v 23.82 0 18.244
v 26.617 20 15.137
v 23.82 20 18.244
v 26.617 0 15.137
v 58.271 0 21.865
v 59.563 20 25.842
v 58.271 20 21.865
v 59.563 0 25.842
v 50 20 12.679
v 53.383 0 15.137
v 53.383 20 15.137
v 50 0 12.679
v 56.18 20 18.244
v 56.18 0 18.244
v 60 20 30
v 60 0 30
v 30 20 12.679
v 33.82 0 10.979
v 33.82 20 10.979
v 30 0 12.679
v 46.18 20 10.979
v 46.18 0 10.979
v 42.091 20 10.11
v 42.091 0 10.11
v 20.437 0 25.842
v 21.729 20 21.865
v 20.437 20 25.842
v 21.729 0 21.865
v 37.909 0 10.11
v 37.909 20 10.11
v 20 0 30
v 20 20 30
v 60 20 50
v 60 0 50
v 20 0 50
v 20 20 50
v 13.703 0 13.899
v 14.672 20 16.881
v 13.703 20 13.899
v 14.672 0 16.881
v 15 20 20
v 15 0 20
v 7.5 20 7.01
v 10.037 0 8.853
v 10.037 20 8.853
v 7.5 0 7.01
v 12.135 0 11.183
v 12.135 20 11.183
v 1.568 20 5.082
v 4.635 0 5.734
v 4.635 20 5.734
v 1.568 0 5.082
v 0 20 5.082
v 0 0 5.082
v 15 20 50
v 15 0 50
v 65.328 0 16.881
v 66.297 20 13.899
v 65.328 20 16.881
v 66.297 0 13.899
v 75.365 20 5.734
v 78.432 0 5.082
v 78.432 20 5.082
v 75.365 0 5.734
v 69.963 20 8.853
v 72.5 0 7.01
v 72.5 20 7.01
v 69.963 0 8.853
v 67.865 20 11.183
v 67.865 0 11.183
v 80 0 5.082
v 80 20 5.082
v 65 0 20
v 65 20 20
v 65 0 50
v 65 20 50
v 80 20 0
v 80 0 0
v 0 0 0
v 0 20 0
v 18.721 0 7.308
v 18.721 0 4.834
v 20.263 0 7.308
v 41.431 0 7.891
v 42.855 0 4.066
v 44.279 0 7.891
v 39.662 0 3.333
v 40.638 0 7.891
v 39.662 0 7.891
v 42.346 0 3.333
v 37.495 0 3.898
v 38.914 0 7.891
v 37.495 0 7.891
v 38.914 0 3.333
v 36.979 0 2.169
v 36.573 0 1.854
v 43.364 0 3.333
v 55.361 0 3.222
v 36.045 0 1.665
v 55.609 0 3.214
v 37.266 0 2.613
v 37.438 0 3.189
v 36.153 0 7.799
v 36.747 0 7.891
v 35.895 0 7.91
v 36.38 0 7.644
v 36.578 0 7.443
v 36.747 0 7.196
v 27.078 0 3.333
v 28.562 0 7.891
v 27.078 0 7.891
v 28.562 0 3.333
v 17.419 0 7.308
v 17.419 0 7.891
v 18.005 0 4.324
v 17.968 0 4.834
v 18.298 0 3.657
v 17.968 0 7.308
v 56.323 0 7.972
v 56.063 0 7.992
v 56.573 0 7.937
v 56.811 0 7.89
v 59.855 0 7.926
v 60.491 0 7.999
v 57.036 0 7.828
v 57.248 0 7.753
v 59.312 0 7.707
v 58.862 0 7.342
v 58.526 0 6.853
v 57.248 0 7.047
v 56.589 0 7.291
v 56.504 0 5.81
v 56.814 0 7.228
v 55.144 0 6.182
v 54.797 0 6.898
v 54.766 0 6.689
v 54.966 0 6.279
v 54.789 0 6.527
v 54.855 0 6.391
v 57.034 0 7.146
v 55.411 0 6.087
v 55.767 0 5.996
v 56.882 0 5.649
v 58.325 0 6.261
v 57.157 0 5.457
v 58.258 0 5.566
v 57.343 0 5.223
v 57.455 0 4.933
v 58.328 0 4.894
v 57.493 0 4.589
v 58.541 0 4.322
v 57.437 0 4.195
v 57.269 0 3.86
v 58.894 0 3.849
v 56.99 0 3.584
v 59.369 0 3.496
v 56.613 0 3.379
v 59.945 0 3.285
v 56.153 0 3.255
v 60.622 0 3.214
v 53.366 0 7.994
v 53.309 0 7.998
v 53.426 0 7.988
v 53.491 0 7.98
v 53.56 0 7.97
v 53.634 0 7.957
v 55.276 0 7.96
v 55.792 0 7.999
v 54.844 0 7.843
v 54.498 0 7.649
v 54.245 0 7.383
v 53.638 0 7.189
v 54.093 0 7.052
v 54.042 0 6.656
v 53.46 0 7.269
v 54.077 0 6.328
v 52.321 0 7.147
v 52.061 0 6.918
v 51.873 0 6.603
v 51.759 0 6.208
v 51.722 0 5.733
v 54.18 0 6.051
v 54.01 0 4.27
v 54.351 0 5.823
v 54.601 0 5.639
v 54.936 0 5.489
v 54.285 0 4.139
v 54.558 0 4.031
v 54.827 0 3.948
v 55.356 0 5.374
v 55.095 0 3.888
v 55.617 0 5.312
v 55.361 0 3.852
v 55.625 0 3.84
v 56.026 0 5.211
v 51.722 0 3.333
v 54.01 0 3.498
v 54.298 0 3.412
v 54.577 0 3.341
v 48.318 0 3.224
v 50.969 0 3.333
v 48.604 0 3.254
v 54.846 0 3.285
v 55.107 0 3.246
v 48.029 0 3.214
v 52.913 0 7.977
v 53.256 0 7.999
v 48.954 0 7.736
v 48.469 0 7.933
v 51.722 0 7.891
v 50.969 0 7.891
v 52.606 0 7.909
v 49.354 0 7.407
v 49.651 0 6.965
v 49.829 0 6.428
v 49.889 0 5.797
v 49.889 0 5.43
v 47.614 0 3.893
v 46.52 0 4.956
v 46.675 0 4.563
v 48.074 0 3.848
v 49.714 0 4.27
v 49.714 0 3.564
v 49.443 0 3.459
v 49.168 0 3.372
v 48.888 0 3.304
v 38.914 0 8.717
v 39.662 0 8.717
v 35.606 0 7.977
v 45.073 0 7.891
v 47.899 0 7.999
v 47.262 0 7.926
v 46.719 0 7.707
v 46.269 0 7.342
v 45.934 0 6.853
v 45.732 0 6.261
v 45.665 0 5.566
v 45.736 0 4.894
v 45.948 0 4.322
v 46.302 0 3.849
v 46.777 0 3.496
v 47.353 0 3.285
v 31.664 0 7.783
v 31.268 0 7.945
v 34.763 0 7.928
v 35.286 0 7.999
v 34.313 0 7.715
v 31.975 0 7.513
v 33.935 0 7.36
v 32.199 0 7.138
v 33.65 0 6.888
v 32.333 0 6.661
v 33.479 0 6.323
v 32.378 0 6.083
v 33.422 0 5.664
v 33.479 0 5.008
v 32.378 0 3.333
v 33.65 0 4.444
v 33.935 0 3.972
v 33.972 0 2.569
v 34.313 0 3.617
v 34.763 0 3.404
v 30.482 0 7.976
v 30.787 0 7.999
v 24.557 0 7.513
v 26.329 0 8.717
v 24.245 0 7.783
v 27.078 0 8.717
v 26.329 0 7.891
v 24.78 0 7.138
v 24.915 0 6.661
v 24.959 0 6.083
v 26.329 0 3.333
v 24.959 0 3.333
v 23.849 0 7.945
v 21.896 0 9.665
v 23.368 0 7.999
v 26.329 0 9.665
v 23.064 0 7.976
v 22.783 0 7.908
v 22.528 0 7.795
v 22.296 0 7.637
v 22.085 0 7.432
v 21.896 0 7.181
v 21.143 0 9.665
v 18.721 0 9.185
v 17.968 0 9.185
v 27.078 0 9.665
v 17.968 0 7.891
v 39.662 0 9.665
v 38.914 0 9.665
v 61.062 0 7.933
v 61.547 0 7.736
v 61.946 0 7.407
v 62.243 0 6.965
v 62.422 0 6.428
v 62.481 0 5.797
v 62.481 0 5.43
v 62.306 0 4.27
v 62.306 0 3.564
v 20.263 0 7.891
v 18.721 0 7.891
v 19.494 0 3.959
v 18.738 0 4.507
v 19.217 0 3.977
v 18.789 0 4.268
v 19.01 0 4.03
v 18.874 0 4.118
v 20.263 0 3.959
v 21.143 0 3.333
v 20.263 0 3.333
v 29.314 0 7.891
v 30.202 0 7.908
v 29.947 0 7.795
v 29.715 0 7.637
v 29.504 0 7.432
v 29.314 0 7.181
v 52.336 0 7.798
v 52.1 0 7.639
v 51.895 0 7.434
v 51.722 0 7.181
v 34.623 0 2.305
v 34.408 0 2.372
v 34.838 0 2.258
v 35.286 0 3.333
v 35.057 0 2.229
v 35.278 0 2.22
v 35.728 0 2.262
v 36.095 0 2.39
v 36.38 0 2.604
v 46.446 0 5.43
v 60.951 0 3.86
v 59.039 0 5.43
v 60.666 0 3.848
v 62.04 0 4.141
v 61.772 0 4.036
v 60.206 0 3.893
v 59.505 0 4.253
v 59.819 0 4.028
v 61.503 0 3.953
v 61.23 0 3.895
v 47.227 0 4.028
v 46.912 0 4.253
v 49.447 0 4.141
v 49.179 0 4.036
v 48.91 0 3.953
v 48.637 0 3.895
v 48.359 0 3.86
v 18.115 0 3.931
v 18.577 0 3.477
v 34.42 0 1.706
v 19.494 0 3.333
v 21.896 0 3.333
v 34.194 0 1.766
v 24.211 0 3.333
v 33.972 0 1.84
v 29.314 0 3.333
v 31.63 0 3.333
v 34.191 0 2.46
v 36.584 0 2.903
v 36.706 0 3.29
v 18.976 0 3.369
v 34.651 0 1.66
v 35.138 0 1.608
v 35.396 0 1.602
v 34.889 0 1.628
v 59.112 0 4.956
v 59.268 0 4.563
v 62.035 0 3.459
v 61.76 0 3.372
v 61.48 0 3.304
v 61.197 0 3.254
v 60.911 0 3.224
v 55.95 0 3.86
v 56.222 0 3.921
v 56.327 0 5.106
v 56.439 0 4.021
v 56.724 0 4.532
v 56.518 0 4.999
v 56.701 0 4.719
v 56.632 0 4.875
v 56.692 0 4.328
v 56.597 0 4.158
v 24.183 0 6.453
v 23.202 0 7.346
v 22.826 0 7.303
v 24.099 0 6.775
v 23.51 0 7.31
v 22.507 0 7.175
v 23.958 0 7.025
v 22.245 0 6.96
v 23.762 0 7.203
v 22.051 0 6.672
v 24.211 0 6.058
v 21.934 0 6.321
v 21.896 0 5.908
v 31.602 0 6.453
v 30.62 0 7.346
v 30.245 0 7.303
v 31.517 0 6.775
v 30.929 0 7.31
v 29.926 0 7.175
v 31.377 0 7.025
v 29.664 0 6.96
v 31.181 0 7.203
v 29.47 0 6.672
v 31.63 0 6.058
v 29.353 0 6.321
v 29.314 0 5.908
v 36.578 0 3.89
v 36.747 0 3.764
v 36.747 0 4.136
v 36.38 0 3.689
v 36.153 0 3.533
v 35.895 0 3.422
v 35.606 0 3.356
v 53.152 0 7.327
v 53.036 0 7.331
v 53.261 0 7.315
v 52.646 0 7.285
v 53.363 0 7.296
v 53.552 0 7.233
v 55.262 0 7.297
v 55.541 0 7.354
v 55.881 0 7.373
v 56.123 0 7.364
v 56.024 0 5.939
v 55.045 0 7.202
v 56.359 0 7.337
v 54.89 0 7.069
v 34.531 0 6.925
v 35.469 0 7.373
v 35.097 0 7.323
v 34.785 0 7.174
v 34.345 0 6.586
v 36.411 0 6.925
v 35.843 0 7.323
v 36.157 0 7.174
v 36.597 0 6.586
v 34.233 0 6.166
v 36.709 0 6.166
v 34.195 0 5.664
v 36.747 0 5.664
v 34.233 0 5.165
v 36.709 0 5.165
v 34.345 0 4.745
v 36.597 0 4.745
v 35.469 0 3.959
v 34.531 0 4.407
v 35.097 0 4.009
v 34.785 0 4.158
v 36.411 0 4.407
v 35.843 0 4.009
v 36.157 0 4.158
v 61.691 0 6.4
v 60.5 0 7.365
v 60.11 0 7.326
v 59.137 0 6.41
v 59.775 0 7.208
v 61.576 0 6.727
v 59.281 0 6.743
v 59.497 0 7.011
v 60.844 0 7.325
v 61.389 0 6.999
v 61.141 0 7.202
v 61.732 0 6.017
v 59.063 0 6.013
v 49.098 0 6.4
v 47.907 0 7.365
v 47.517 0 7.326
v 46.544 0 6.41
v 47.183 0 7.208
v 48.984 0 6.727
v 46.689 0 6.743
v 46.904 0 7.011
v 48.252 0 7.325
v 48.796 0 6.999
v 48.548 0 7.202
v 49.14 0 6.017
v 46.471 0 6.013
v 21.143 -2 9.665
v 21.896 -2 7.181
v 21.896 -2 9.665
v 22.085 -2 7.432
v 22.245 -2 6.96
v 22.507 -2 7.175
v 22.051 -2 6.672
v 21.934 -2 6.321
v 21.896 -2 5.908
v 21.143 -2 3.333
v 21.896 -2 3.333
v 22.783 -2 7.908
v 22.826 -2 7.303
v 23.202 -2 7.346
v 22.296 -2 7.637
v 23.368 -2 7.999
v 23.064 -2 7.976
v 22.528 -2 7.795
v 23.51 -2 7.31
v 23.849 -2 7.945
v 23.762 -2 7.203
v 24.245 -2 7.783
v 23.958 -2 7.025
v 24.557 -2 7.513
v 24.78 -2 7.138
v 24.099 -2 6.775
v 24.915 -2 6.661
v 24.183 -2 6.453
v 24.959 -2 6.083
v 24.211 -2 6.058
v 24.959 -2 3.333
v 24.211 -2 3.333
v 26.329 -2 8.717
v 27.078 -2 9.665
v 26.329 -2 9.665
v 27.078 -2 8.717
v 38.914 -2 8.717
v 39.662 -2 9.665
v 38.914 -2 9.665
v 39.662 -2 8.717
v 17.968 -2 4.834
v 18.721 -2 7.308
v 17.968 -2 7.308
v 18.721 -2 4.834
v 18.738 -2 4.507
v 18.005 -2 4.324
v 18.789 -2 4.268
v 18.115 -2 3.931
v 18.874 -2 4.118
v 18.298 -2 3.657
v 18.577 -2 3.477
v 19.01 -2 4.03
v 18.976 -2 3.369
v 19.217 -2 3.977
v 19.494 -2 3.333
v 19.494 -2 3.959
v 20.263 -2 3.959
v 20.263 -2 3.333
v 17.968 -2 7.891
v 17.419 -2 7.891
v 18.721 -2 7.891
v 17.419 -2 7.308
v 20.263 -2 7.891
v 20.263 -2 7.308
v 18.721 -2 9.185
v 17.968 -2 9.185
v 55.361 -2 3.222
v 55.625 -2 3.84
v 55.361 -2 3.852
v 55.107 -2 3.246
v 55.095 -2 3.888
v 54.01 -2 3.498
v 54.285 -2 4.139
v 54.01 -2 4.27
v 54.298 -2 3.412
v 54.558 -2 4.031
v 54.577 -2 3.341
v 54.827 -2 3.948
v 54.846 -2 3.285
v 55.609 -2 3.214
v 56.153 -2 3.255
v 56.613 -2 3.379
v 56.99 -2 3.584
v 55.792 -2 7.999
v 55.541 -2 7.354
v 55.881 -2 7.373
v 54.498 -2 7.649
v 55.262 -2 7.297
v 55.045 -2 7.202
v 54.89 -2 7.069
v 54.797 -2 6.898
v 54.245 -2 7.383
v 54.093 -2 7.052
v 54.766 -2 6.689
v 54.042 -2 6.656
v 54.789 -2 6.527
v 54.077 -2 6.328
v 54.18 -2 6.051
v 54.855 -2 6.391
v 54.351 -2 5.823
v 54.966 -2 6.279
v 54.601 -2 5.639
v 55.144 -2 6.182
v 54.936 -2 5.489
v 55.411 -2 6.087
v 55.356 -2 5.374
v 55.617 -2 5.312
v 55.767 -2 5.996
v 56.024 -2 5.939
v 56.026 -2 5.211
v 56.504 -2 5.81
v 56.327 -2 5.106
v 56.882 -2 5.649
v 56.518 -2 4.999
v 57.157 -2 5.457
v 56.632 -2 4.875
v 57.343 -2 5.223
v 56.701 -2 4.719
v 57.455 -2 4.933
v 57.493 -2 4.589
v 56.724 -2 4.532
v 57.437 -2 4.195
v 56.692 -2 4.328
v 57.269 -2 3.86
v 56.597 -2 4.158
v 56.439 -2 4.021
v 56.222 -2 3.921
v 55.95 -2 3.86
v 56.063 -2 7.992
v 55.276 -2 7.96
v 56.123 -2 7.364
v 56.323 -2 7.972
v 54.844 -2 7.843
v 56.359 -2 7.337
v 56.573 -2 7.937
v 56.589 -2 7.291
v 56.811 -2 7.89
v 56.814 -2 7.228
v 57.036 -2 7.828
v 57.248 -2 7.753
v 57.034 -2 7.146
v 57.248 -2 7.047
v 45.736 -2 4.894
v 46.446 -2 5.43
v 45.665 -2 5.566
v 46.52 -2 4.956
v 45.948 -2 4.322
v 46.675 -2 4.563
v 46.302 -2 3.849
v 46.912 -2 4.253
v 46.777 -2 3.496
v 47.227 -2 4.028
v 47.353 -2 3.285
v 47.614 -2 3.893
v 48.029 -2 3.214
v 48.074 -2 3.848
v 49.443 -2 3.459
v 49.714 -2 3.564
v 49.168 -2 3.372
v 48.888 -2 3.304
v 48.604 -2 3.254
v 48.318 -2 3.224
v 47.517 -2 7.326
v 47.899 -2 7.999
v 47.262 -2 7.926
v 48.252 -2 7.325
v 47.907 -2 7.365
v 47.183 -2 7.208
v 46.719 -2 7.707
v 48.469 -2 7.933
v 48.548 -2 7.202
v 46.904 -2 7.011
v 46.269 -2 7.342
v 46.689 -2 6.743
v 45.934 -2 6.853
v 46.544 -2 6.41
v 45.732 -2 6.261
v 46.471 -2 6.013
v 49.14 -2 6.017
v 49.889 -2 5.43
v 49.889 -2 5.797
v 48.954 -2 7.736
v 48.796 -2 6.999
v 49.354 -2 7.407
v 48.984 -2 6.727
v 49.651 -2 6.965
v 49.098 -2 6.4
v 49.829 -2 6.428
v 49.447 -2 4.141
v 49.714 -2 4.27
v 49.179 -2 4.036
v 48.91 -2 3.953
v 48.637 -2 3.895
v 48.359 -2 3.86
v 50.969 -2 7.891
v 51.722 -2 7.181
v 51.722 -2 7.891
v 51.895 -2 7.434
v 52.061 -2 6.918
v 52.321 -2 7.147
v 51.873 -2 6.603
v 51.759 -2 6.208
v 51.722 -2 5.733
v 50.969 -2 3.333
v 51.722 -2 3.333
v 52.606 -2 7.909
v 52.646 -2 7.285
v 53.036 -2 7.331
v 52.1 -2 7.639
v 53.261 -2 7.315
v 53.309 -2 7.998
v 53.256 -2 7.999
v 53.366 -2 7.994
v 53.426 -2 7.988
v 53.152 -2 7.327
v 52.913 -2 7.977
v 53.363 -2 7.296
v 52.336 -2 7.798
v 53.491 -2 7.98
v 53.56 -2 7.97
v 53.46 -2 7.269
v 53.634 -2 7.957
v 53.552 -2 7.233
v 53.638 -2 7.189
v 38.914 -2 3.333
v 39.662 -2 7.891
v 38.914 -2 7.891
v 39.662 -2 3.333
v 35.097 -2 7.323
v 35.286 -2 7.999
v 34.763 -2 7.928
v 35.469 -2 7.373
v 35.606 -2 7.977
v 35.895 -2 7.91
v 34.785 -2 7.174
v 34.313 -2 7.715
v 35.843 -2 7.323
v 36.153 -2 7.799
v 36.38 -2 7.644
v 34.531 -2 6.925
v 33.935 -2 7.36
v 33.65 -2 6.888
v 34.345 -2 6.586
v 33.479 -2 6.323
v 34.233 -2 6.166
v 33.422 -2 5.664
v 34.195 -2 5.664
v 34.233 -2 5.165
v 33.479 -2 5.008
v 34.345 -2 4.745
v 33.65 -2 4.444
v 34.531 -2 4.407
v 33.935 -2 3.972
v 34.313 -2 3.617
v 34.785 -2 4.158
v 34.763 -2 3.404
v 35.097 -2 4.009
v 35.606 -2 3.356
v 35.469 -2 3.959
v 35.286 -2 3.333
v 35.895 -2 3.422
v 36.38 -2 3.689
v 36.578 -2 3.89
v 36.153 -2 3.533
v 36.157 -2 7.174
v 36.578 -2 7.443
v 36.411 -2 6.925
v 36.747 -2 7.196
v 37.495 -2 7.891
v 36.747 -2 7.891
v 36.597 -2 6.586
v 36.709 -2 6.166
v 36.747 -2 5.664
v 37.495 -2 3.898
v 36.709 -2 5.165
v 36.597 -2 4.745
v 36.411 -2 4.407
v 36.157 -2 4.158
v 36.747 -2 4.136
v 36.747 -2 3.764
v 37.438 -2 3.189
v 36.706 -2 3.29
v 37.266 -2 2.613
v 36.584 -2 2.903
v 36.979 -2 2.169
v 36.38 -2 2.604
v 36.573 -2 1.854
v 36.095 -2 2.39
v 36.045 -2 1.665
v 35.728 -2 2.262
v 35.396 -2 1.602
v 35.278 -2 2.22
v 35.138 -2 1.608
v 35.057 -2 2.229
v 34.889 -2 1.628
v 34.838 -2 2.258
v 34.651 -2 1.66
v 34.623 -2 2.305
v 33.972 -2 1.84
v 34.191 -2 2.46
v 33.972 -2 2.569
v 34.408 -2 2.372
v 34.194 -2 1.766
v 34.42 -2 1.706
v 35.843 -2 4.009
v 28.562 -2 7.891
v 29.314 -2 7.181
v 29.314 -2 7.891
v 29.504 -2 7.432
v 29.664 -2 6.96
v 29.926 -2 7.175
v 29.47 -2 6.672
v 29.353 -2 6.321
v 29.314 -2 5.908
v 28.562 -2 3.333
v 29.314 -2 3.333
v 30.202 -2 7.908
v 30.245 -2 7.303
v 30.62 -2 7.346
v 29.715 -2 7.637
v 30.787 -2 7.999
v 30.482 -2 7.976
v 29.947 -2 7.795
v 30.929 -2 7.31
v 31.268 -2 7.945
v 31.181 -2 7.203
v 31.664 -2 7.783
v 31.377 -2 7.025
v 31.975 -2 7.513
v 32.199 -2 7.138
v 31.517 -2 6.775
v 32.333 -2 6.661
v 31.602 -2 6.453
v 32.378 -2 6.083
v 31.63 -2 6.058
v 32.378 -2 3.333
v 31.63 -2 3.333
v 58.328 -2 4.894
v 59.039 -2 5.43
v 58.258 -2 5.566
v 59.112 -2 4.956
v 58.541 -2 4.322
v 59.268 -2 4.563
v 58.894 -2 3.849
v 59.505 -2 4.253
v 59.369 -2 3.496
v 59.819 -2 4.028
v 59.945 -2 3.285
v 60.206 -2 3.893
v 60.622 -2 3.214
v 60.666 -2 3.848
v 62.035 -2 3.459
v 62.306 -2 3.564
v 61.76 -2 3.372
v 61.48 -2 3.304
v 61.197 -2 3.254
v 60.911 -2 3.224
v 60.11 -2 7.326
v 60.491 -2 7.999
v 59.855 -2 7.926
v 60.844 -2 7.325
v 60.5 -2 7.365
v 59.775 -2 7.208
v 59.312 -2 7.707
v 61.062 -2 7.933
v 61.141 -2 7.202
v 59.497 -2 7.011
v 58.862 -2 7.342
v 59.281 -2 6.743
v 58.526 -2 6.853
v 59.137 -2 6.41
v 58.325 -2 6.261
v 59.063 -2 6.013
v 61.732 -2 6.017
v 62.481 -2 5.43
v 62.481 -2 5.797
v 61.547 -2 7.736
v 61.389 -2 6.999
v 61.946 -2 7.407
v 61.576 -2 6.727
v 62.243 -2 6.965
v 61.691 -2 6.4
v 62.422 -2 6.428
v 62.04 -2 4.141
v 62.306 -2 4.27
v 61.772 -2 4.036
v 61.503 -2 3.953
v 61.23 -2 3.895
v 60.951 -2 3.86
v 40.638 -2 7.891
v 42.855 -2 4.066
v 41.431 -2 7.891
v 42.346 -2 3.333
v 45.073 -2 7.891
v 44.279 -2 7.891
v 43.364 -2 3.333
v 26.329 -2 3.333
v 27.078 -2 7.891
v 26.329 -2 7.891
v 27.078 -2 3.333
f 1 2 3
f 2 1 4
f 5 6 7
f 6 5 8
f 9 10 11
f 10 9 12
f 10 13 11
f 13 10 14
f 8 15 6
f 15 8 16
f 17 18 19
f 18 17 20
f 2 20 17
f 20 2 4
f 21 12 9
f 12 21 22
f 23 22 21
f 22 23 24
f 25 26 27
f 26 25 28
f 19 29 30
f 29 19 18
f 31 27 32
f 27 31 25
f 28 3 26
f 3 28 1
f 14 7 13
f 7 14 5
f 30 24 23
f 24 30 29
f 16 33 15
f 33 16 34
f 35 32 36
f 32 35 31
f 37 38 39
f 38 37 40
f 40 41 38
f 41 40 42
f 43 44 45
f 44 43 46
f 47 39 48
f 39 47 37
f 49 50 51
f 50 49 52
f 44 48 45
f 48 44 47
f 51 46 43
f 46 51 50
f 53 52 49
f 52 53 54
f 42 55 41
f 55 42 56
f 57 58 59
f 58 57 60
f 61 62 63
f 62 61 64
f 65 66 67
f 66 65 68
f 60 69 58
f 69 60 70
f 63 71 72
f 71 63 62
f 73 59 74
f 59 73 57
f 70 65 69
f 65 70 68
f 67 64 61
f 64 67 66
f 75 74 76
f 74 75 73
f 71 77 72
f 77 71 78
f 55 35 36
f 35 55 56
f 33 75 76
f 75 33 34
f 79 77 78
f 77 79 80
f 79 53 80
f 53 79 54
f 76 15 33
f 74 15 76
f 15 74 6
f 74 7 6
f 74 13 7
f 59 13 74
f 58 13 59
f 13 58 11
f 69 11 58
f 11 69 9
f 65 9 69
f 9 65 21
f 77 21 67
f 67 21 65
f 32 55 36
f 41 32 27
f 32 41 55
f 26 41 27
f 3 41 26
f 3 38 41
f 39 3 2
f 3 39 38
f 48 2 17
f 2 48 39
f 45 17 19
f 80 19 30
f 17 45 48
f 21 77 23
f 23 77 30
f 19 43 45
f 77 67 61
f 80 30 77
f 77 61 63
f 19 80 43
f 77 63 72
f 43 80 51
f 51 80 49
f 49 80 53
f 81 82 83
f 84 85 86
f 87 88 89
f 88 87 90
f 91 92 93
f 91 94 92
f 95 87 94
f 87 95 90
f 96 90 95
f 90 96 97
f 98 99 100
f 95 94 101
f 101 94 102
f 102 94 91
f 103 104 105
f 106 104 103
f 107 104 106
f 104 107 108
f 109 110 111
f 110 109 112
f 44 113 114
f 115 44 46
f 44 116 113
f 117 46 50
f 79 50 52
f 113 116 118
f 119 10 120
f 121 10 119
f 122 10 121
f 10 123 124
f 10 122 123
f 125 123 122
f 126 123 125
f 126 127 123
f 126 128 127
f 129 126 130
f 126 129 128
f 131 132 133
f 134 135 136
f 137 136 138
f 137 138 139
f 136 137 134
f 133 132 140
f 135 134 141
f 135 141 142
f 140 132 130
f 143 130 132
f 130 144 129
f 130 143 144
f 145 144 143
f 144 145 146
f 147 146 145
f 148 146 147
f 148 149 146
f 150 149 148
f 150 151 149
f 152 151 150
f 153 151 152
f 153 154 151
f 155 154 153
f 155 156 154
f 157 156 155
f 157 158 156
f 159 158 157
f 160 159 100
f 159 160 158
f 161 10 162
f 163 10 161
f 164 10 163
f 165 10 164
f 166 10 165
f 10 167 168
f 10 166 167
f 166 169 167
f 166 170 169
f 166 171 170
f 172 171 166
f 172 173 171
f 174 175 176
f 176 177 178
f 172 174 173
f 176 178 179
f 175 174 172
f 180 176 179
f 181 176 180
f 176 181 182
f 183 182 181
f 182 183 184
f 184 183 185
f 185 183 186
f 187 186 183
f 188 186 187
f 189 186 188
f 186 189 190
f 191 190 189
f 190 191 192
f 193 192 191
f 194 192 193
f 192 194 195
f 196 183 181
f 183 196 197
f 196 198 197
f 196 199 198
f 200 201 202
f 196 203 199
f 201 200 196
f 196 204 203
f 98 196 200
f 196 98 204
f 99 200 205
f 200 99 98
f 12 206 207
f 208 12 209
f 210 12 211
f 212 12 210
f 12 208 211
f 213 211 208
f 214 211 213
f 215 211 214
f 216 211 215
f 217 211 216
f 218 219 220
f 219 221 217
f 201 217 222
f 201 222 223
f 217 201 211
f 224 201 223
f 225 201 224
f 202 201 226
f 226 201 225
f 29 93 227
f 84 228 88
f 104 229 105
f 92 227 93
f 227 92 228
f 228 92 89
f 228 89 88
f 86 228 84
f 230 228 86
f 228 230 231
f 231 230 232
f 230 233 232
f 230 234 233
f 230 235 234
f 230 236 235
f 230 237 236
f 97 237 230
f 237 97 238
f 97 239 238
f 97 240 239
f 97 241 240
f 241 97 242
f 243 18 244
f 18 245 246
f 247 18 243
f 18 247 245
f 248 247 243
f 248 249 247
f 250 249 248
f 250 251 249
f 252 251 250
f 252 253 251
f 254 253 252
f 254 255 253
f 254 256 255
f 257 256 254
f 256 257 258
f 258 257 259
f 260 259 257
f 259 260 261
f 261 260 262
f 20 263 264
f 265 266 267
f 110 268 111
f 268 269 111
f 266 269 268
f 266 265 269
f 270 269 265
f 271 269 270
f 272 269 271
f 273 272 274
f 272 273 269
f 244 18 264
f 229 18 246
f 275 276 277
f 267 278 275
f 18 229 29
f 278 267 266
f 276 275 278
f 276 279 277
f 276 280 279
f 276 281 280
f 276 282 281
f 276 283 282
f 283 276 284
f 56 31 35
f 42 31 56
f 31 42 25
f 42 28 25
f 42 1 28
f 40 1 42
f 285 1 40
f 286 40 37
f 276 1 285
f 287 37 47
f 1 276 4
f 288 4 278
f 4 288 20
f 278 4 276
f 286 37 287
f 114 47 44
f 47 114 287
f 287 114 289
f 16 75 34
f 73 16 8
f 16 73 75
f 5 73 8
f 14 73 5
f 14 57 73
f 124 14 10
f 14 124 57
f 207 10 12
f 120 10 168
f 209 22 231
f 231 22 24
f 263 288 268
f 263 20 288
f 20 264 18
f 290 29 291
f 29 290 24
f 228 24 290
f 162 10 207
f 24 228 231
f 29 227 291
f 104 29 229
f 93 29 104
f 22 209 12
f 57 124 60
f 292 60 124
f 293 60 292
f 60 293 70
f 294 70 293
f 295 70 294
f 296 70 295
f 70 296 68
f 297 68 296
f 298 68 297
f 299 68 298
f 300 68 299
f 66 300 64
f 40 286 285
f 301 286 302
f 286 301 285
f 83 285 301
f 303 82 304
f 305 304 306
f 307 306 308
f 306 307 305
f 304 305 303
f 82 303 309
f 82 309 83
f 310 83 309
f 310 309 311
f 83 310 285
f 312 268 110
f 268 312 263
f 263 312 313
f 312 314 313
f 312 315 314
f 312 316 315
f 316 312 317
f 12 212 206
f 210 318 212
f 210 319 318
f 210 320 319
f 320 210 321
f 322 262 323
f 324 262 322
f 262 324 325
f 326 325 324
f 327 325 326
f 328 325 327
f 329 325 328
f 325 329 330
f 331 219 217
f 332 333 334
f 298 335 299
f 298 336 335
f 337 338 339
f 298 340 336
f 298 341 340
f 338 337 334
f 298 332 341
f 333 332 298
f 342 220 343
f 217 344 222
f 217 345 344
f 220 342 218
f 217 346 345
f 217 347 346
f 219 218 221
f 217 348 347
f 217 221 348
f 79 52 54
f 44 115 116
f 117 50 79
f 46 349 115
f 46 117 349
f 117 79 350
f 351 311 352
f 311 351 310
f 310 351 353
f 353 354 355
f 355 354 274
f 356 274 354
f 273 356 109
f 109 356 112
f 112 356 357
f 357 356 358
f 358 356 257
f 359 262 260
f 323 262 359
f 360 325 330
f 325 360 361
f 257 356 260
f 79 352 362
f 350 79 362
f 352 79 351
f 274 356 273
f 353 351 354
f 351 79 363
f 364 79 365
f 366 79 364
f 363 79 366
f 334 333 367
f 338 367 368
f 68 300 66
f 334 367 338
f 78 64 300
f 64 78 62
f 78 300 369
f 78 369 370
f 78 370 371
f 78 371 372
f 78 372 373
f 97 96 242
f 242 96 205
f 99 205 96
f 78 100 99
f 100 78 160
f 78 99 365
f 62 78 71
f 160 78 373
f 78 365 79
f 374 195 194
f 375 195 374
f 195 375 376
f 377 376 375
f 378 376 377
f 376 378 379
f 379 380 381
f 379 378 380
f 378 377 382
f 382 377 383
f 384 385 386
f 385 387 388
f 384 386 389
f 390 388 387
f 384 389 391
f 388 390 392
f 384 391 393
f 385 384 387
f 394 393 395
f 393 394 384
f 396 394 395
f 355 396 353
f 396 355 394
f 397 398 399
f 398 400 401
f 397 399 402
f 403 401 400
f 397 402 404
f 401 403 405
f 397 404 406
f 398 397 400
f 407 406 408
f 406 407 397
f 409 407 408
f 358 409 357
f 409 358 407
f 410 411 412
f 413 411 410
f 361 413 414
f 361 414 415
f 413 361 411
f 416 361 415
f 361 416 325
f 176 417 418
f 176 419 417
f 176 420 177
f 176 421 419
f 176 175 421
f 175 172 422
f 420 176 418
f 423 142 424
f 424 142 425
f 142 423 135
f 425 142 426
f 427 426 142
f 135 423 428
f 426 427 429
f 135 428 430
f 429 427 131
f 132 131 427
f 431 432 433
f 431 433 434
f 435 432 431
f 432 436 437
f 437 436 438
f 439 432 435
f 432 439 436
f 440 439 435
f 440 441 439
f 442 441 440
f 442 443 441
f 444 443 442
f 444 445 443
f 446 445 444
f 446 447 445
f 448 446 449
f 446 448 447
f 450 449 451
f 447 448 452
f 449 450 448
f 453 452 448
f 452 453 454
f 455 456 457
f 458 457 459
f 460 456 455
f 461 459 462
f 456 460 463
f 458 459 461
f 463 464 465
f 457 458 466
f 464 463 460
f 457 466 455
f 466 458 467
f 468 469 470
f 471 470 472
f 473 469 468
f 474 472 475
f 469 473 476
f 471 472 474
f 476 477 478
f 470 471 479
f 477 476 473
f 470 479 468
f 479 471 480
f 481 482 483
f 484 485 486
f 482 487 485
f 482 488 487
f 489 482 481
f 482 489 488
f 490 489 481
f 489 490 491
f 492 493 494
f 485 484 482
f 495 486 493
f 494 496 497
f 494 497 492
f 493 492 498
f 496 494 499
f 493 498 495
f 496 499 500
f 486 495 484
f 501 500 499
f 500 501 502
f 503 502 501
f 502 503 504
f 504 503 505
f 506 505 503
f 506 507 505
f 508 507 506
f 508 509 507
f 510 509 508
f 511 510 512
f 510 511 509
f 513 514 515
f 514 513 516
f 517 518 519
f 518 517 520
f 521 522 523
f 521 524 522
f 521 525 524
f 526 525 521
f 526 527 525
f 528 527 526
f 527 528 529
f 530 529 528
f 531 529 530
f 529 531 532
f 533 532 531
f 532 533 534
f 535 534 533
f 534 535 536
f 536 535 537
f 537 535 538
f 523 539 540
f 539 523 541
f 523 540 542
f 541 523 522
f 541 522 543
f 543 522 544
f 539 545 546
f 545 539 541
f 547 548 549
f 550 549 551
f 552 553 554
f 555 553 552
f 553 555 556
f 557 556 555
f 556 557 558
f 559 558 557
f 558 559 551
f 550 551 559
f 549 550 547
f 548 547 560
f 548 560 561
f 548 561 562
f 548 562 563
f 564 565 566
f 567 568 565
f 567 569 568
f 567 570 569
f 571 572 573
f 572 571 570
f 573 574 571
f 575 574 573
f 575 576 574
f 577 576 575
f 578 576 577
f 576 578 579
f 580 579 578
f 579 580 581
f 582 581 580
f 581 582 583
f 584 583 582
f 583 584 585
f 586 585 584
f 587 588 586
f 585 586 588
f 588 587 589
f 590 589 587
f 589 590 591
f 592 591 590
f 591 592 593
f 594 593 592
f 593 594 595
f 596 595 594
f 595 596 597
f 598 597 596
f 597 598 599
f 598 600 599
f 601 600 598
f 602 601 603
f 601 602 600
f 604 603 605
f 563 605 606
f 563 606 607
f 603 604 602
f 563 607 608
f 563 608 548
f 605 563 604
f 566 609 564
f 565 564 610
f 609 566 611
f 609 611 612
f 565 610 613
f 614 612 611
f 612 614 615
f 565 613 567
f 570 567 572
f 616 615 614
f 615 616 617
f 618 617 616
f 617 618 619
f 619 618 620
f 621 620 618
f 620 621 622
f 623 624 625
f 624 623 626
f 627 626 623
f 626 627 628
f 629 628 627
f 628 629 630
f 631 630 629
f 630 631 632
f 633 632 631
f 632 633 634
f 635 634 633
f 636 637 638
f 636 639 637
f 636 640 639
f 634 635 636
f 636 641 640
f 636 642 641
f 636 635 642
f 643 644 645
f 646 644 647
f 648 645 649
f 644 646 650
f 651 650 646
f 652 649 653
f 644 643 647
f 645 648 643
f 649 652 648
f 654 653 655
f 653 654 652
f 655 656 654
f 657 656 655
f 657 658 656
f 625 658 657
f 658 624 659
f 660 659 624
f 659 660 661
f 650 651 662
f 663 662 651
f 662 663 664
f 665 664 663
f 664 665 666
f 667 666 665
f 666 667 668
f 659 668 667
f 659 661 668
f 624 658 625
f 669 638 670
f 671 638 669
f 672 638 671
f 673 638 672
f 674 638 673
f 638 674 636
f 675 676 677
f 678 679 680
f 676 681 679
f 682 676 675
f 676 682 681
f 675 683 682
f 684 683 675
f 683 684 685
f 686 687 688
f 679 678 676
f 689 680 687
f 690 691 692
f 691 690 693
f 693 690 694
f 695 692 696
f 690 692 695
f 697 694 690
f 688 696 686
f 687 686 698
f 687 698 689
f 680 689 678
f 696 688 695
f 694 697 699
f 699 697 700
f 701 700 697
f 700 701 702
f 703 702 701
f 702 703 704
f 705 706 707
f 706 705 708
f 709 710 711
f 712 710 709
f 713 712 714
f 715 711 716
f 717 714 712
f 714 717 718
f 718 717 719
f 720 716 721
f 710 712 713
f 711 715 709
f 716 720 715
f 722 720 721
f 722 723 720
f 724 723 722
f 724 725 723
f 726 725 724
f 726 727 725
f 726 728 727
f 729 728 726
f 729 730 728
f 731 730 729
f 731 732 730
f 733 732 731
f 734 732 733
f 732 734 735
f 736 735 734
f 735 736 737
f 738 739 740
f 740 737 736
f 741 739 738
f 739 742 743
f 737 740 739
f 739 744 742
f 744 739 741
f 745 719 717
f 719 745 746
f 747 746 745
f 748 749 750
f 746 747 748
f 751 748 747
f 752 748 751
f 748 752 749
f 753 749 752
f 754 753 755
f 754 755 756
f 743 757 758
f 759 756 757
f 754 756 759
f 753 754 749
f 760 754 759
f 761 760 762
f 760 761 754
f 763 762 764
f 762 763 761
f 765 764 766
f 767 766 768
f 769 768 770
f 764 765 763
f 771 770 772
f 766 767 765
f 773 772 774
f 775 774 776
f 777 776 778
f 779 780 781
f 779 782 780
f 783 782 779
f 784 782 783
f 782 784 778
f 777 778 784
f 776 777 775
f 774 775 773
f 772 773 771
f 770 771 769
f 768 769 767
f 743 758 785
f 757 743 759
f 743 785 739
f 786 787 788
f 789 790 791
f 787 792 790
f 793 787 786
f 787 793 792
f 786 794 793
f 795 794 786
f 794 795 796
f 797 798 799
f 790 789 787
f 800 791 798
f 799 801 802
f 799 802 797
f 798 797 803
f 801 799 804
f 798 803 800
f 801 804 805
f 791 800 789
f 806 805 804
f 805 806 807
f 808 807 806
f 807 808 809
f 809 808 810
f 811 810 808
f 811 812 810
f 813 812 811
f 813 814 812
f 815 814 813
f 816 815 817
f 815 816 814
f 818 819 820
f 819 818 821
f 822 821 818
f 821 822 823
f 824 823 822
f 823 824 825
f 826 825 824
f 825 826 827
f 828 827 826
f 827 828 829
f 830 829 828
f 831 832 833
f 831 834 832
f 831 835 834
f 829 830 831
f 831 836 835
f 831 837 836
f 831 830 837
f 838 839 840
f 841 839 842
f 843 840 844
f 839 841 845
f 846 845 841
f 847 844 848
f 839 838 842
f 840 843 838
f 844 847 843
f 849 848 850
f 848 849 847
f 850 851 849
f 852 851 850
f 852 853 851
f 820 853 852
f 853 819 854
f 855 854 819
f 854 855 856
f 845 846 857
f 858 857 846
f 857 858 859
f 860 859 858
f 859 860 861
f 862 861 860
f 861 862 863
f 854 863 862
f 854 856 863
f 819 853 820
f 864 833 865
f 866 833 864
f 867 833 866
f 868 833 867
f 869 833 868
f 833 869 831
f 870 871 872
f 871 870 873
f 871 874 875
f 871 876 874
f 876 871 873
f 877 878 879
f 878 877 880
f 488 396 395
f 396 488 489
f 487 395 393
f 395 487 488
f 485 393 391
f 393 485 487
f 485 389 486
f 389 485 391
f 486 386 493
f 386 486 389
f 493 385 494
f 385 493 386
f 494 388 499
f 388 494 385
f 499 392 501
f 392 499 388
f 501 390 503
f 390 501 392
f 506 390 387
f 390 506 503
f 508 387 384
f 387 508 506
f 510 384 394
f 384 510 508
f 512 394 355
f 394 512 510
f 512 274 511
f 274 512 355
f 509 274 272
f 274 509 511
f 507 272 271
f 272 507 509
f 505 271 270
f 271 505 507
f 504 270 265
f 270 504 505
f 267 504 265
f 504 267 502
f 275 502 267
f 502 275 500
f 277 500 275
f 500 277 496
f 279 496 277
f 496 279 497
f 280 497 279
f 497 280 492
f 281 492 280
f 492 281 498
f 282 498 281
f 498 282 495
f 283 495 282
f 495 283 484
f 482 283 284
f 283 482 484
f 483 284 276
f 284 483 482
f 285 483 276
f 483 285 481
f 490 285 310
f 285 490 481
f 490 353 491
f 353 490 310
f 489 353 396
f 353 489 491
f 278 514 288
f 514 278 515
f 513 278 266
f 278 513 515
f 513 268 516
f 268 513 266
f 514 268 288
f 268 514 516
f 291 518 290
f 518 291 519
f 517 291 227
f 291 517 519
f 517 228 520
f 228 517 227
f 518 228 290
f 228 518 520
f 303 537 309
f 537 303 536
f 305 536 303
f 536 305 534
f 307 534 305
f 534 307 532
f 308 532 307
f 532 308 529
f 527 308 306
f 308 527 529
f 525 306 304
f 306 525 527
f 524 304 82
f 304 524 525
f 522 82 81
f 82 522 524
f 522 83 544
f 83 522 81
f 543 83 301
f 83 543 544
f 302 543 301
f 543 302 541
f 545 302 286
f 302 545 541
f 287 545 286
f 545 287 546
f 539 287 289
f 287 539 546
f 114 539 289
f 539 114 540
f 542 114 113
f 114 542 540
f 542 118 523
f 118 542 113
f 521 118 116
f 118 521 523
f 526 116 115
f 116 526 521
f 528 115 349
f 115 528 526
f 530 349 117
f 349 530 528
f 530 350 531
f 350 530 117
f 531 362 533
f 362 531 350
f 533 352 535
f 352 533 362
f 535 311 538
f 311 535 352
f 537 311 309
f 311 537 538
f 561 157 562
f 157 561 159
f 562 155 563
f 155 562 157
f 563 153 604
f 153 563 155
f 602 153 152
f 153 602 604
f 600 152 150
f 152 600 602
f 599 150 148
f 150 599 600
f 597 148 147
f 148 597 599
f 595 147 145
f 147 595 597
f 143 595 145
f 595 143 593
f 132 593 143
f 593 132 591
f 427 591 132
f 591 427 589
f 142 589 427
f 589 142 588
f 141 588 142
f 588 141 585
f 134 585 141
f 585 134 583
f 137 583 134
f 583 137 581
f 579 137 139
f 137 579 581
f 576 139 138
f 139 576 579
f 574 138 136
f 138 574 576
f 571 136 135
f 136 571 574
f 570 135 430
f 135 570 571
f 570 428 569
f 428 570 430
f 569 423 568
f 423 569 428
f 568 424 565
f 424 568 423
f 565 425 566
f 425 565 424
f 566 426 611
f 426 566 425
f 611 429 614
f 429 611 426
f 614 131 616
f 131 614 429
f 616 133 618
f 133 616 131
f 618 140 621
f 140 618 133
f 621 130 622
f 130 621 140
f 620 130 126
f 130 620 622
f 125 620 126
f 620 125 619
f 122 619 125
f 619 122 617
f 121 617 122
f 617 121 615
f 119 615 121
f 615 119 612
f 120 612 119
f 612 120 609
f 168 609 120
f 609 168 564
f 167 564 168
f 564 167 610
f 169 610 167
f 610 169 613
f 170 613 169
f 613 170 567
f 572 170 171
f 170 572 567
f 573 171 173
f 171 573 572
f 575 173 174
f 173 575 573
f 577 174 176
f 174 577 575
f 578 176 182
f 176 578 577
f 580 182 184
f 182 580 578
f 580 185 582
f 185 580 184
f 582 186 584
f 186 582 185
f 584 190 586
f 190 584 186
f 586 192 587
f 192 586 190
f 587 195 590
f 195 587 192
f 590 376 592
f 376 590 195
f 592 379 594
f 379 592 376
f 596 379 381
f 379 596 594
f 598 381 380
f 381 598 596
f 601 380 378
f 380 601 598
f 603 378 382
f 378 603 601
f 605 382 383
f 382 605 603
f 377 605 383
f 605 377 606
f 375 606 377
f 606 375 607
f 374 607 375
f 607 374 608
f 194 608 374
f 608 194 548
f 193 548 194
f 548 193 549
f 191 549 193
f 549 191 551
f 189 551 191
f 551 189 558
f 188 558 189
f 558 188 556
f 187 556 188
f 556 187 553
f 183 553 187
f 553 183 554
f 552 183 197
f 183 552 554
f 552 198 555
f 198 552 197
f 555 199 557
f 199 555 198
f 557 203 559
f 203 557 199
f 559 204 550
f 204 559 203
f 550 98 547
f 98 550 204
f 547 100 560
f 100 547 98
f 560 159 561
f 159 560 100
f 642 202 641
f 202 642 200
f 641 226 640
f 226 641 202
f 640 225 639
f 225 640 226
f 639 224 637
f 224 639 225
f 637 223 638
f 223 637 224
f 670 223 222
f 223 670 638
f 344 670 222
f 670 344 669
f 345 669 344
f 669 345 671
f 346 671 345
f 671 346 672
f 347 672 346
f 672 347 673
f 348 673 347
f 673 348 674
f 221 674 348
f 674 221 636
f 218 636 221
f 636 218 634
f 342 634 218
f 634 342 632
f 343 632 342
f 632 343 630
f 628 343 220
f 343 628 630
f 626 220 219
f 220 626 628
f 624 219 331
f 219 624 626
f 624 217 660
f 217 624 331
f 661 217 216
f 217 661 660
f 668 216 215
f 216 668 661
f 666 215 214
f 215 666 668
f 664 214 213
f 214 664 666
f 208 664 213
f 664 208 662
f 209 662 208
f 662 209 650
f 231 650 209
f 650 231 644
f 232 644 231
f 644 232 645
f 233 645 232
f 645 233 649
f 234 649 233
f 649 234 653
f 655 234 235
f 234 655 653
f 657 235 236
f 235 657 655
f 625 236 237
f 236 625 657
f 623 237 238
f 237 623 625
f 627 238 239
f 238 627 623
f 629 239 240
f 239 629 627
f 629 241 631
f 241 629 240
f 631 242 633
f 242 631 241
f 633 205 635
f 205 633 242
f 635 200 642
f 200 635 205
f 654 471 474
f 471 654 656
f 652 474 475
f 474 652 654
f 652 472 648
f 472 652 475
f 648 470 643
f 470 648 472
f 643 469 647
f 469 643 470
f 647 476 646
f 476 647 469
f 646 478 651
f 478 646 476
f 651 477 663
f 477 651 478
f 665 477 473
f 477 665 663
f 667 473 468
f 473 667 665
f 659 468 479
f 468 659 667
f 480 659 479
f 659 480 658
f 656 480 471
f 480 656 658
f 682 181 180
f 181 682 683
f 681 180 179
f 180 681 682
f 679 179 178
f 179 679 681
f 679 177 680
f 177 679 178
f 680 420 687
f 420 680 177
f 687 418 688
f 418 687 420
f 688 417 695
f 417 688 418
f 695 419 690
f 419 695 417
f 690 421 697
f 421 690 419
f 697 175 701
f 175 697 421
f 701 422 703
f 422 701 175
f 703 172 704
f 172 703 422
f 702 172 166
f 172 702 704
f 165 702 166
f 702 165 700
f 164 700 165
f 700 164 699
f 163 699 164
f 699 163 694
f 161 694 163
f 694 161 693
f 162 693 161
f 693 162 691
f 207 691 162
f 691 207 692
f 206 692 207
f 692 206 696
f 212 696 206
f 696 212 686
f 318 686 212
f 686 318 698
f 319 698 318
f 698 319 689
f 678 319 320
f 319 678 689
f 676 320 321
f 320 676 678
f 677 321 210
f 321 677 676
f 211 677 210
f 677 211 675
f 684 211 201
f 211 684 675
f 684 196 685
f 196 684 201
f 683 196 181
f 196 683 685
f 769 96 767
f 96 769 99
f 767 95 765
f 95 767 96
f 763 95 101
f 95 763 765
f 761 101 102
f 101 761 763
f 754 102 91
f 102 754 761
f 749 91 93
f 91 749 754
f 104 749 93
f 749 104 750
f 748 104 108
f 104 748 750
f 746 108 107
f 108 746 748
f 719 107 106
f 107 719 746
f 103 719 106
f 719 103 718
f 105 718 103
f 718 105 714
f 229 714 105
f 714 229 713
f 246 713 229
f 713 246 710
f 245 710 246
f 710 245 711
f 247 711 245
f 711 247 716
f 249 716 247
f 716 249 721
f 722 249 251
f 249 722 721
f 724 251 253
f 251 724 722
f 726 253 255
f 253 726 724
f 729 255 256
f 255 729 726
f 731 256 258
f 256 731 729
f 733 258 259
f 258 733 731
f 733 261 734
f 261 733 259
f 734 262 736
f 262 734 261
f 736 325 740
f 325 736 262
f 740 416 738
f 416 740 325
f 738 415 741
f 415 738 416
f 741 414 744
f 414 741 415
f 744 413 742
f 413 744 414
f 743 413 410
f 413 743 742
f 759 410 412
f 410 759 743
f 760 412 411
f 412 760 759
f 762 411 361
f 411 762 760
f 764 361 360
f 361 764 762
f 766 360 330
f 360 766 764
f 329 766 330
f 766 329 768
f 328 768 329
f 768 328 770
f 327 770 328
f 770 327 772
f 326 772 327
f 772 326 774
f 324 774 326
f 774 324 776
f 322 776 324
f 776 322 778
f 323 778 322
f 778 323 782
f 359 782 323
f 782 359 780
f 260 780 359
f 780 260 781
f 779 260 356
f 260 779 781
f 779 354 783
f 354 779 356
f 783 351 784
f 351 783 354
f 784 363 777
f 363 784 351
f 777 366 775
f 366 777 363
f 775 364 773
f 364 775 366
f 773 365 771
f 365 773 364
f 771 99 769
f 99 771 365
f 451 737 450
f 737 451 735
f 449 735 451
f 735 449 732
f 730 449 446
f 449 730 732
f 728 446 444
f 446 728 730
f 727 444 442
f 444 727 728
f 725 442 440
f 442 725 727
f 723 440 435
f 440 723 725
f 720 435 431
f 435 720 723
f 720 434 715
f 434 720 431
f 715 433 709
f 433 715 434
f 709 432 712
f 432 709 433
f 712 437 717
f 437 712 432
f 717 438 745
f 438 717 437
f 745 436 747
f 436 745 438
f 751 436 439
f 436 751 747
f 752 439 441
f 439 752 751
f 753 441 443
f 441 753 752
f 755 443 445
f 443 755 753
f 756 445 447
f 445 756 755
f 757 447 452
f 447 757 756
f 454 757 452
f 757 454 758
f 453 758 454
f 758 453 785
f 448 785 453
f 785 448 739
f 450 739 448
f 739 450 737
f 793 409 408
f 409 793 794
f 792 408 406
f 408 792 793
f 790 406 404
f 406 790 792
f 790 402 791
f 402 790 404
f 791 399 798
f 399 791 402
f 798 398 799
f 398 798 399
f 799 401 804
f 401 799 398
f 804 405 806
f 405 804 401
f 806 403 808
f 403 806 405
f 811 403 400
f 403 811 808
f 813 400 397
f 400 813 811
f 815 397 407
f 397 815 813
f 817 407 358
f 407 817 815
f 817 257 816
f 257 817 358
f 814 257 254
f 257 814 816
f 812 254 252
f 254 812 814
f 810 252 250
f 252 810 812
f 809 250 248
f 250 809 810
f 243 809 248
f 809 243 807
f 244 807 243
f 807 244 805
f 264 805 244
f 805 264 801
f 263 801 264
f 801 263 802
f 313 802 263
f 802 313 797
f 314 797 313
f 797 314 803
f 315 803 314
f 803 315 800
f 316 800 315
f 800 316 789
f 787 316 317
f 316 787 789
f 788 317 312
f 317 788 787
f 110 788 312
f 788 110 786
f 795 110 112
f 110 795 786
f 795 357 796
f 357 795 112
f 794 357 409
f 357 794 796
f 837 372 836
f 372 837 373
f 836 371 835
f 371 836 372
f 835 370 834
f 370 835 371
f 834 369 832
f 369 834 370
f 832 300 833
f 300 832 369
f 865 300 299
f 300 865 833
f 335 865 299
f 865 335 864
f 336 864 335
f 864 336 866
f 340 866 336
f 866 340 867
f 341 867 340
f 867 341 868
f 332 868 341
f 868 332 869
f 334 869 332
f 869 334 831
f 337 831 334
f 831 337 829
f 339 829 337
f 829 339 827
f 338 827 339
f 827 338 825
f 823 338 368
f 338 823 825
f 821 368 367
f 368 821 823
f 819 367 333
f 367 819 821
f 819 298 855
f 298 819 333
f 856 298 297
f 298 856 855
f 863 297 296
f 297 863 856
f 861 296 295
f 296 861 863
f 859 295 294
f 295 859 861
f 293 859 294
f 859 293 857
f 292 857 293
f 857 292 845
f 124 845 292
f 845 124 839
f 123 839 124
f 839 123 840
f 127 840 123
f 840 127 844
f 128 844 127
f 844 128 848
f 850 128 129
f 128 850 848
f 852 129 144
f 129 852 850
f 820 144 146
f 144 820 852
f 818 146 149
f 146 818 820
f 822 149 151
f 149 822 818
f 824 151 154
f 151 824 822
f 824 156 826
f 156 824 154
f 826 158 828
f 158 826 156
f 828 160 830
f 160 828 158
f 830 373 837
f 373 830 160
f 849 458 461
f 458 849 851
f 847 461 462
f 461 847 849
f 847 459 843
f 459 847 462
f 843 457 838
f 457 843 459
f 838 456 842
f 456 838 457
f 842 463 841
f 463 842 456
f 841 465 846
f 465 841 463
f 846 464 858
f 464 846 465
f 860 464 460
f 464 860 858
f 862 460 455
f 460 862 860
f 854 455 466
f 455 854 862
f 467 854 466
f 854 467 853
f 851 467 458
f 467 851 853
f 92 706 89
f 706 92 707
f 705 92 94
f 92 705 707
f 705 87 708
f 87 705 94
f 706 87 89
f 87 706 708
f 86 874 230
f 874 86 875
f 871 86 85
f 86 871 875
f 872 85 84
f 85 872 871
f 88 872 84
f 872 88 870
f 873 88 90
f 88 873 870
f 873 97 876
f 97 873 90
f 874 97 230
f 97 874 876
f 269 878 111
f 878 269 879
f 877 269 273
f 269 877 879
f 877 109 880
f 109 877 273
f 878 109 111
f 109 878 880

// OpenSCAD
// Width
th_x = 80;
// Height
th_z = 50;
// Deep
th_y = 20;
// Central width
th_mid = 40;
// Wall thickness
th_thick = 5;
// Elevation
th_elev = 10;
// Text
txt = "thingiverse";
// Text size
txt_size = 6;
    
thing();

module thing()
{   
    
    r_cyl2 = th_mid/2;
    r_cyl1 = (th_x-(2*th_thick)-th_mid)/2;
    
    difference() {
        cube(size=[th_x,th_y,th_z]);    

        // Central
        rotate(a=[90,0,0])
        translate([th_x/2,th_elev+r_cyl2,-th_y-5]) {
            cylinder(h=th_y+10,r=r_cyl2);
            translate([-r_cyl2,0,0])
                cube(size=[r_cyl2*2,th_z,th_y+10]);
        }

        // Side
        rotate(a=[90,0,0])
        translate([0,th_thick+r_cyl1,-th_y-5]) {
            cylinder(h=th_y+10,r=r_cyl1);
            translate([-r_cyl1,0,0])
                cube(size=[r_cyl1*2,th_z,th_y+10]);
        }
   
        rotate(a=[90,0,0])
        translate([th_x,th_thick+r_cyl1,-th_y-5]) {
            cylinder(h=th_y+10,r=r_cyl1);
            translate([-r_cyl1,0,0])
                cube(size=[r_cyl1*2,th_z,th_y+10]);
        }
    }
    
    color("Green")
    rotate(a=[90,0,0])
    translate([th_x/2, th_elev/3, 1]) {
        linear_extrude(height = 2, center = true, convexity = 10, twist = 0)
        text(txt, size=txt_size, halign="center", font = "Open Sans");
    }
}
